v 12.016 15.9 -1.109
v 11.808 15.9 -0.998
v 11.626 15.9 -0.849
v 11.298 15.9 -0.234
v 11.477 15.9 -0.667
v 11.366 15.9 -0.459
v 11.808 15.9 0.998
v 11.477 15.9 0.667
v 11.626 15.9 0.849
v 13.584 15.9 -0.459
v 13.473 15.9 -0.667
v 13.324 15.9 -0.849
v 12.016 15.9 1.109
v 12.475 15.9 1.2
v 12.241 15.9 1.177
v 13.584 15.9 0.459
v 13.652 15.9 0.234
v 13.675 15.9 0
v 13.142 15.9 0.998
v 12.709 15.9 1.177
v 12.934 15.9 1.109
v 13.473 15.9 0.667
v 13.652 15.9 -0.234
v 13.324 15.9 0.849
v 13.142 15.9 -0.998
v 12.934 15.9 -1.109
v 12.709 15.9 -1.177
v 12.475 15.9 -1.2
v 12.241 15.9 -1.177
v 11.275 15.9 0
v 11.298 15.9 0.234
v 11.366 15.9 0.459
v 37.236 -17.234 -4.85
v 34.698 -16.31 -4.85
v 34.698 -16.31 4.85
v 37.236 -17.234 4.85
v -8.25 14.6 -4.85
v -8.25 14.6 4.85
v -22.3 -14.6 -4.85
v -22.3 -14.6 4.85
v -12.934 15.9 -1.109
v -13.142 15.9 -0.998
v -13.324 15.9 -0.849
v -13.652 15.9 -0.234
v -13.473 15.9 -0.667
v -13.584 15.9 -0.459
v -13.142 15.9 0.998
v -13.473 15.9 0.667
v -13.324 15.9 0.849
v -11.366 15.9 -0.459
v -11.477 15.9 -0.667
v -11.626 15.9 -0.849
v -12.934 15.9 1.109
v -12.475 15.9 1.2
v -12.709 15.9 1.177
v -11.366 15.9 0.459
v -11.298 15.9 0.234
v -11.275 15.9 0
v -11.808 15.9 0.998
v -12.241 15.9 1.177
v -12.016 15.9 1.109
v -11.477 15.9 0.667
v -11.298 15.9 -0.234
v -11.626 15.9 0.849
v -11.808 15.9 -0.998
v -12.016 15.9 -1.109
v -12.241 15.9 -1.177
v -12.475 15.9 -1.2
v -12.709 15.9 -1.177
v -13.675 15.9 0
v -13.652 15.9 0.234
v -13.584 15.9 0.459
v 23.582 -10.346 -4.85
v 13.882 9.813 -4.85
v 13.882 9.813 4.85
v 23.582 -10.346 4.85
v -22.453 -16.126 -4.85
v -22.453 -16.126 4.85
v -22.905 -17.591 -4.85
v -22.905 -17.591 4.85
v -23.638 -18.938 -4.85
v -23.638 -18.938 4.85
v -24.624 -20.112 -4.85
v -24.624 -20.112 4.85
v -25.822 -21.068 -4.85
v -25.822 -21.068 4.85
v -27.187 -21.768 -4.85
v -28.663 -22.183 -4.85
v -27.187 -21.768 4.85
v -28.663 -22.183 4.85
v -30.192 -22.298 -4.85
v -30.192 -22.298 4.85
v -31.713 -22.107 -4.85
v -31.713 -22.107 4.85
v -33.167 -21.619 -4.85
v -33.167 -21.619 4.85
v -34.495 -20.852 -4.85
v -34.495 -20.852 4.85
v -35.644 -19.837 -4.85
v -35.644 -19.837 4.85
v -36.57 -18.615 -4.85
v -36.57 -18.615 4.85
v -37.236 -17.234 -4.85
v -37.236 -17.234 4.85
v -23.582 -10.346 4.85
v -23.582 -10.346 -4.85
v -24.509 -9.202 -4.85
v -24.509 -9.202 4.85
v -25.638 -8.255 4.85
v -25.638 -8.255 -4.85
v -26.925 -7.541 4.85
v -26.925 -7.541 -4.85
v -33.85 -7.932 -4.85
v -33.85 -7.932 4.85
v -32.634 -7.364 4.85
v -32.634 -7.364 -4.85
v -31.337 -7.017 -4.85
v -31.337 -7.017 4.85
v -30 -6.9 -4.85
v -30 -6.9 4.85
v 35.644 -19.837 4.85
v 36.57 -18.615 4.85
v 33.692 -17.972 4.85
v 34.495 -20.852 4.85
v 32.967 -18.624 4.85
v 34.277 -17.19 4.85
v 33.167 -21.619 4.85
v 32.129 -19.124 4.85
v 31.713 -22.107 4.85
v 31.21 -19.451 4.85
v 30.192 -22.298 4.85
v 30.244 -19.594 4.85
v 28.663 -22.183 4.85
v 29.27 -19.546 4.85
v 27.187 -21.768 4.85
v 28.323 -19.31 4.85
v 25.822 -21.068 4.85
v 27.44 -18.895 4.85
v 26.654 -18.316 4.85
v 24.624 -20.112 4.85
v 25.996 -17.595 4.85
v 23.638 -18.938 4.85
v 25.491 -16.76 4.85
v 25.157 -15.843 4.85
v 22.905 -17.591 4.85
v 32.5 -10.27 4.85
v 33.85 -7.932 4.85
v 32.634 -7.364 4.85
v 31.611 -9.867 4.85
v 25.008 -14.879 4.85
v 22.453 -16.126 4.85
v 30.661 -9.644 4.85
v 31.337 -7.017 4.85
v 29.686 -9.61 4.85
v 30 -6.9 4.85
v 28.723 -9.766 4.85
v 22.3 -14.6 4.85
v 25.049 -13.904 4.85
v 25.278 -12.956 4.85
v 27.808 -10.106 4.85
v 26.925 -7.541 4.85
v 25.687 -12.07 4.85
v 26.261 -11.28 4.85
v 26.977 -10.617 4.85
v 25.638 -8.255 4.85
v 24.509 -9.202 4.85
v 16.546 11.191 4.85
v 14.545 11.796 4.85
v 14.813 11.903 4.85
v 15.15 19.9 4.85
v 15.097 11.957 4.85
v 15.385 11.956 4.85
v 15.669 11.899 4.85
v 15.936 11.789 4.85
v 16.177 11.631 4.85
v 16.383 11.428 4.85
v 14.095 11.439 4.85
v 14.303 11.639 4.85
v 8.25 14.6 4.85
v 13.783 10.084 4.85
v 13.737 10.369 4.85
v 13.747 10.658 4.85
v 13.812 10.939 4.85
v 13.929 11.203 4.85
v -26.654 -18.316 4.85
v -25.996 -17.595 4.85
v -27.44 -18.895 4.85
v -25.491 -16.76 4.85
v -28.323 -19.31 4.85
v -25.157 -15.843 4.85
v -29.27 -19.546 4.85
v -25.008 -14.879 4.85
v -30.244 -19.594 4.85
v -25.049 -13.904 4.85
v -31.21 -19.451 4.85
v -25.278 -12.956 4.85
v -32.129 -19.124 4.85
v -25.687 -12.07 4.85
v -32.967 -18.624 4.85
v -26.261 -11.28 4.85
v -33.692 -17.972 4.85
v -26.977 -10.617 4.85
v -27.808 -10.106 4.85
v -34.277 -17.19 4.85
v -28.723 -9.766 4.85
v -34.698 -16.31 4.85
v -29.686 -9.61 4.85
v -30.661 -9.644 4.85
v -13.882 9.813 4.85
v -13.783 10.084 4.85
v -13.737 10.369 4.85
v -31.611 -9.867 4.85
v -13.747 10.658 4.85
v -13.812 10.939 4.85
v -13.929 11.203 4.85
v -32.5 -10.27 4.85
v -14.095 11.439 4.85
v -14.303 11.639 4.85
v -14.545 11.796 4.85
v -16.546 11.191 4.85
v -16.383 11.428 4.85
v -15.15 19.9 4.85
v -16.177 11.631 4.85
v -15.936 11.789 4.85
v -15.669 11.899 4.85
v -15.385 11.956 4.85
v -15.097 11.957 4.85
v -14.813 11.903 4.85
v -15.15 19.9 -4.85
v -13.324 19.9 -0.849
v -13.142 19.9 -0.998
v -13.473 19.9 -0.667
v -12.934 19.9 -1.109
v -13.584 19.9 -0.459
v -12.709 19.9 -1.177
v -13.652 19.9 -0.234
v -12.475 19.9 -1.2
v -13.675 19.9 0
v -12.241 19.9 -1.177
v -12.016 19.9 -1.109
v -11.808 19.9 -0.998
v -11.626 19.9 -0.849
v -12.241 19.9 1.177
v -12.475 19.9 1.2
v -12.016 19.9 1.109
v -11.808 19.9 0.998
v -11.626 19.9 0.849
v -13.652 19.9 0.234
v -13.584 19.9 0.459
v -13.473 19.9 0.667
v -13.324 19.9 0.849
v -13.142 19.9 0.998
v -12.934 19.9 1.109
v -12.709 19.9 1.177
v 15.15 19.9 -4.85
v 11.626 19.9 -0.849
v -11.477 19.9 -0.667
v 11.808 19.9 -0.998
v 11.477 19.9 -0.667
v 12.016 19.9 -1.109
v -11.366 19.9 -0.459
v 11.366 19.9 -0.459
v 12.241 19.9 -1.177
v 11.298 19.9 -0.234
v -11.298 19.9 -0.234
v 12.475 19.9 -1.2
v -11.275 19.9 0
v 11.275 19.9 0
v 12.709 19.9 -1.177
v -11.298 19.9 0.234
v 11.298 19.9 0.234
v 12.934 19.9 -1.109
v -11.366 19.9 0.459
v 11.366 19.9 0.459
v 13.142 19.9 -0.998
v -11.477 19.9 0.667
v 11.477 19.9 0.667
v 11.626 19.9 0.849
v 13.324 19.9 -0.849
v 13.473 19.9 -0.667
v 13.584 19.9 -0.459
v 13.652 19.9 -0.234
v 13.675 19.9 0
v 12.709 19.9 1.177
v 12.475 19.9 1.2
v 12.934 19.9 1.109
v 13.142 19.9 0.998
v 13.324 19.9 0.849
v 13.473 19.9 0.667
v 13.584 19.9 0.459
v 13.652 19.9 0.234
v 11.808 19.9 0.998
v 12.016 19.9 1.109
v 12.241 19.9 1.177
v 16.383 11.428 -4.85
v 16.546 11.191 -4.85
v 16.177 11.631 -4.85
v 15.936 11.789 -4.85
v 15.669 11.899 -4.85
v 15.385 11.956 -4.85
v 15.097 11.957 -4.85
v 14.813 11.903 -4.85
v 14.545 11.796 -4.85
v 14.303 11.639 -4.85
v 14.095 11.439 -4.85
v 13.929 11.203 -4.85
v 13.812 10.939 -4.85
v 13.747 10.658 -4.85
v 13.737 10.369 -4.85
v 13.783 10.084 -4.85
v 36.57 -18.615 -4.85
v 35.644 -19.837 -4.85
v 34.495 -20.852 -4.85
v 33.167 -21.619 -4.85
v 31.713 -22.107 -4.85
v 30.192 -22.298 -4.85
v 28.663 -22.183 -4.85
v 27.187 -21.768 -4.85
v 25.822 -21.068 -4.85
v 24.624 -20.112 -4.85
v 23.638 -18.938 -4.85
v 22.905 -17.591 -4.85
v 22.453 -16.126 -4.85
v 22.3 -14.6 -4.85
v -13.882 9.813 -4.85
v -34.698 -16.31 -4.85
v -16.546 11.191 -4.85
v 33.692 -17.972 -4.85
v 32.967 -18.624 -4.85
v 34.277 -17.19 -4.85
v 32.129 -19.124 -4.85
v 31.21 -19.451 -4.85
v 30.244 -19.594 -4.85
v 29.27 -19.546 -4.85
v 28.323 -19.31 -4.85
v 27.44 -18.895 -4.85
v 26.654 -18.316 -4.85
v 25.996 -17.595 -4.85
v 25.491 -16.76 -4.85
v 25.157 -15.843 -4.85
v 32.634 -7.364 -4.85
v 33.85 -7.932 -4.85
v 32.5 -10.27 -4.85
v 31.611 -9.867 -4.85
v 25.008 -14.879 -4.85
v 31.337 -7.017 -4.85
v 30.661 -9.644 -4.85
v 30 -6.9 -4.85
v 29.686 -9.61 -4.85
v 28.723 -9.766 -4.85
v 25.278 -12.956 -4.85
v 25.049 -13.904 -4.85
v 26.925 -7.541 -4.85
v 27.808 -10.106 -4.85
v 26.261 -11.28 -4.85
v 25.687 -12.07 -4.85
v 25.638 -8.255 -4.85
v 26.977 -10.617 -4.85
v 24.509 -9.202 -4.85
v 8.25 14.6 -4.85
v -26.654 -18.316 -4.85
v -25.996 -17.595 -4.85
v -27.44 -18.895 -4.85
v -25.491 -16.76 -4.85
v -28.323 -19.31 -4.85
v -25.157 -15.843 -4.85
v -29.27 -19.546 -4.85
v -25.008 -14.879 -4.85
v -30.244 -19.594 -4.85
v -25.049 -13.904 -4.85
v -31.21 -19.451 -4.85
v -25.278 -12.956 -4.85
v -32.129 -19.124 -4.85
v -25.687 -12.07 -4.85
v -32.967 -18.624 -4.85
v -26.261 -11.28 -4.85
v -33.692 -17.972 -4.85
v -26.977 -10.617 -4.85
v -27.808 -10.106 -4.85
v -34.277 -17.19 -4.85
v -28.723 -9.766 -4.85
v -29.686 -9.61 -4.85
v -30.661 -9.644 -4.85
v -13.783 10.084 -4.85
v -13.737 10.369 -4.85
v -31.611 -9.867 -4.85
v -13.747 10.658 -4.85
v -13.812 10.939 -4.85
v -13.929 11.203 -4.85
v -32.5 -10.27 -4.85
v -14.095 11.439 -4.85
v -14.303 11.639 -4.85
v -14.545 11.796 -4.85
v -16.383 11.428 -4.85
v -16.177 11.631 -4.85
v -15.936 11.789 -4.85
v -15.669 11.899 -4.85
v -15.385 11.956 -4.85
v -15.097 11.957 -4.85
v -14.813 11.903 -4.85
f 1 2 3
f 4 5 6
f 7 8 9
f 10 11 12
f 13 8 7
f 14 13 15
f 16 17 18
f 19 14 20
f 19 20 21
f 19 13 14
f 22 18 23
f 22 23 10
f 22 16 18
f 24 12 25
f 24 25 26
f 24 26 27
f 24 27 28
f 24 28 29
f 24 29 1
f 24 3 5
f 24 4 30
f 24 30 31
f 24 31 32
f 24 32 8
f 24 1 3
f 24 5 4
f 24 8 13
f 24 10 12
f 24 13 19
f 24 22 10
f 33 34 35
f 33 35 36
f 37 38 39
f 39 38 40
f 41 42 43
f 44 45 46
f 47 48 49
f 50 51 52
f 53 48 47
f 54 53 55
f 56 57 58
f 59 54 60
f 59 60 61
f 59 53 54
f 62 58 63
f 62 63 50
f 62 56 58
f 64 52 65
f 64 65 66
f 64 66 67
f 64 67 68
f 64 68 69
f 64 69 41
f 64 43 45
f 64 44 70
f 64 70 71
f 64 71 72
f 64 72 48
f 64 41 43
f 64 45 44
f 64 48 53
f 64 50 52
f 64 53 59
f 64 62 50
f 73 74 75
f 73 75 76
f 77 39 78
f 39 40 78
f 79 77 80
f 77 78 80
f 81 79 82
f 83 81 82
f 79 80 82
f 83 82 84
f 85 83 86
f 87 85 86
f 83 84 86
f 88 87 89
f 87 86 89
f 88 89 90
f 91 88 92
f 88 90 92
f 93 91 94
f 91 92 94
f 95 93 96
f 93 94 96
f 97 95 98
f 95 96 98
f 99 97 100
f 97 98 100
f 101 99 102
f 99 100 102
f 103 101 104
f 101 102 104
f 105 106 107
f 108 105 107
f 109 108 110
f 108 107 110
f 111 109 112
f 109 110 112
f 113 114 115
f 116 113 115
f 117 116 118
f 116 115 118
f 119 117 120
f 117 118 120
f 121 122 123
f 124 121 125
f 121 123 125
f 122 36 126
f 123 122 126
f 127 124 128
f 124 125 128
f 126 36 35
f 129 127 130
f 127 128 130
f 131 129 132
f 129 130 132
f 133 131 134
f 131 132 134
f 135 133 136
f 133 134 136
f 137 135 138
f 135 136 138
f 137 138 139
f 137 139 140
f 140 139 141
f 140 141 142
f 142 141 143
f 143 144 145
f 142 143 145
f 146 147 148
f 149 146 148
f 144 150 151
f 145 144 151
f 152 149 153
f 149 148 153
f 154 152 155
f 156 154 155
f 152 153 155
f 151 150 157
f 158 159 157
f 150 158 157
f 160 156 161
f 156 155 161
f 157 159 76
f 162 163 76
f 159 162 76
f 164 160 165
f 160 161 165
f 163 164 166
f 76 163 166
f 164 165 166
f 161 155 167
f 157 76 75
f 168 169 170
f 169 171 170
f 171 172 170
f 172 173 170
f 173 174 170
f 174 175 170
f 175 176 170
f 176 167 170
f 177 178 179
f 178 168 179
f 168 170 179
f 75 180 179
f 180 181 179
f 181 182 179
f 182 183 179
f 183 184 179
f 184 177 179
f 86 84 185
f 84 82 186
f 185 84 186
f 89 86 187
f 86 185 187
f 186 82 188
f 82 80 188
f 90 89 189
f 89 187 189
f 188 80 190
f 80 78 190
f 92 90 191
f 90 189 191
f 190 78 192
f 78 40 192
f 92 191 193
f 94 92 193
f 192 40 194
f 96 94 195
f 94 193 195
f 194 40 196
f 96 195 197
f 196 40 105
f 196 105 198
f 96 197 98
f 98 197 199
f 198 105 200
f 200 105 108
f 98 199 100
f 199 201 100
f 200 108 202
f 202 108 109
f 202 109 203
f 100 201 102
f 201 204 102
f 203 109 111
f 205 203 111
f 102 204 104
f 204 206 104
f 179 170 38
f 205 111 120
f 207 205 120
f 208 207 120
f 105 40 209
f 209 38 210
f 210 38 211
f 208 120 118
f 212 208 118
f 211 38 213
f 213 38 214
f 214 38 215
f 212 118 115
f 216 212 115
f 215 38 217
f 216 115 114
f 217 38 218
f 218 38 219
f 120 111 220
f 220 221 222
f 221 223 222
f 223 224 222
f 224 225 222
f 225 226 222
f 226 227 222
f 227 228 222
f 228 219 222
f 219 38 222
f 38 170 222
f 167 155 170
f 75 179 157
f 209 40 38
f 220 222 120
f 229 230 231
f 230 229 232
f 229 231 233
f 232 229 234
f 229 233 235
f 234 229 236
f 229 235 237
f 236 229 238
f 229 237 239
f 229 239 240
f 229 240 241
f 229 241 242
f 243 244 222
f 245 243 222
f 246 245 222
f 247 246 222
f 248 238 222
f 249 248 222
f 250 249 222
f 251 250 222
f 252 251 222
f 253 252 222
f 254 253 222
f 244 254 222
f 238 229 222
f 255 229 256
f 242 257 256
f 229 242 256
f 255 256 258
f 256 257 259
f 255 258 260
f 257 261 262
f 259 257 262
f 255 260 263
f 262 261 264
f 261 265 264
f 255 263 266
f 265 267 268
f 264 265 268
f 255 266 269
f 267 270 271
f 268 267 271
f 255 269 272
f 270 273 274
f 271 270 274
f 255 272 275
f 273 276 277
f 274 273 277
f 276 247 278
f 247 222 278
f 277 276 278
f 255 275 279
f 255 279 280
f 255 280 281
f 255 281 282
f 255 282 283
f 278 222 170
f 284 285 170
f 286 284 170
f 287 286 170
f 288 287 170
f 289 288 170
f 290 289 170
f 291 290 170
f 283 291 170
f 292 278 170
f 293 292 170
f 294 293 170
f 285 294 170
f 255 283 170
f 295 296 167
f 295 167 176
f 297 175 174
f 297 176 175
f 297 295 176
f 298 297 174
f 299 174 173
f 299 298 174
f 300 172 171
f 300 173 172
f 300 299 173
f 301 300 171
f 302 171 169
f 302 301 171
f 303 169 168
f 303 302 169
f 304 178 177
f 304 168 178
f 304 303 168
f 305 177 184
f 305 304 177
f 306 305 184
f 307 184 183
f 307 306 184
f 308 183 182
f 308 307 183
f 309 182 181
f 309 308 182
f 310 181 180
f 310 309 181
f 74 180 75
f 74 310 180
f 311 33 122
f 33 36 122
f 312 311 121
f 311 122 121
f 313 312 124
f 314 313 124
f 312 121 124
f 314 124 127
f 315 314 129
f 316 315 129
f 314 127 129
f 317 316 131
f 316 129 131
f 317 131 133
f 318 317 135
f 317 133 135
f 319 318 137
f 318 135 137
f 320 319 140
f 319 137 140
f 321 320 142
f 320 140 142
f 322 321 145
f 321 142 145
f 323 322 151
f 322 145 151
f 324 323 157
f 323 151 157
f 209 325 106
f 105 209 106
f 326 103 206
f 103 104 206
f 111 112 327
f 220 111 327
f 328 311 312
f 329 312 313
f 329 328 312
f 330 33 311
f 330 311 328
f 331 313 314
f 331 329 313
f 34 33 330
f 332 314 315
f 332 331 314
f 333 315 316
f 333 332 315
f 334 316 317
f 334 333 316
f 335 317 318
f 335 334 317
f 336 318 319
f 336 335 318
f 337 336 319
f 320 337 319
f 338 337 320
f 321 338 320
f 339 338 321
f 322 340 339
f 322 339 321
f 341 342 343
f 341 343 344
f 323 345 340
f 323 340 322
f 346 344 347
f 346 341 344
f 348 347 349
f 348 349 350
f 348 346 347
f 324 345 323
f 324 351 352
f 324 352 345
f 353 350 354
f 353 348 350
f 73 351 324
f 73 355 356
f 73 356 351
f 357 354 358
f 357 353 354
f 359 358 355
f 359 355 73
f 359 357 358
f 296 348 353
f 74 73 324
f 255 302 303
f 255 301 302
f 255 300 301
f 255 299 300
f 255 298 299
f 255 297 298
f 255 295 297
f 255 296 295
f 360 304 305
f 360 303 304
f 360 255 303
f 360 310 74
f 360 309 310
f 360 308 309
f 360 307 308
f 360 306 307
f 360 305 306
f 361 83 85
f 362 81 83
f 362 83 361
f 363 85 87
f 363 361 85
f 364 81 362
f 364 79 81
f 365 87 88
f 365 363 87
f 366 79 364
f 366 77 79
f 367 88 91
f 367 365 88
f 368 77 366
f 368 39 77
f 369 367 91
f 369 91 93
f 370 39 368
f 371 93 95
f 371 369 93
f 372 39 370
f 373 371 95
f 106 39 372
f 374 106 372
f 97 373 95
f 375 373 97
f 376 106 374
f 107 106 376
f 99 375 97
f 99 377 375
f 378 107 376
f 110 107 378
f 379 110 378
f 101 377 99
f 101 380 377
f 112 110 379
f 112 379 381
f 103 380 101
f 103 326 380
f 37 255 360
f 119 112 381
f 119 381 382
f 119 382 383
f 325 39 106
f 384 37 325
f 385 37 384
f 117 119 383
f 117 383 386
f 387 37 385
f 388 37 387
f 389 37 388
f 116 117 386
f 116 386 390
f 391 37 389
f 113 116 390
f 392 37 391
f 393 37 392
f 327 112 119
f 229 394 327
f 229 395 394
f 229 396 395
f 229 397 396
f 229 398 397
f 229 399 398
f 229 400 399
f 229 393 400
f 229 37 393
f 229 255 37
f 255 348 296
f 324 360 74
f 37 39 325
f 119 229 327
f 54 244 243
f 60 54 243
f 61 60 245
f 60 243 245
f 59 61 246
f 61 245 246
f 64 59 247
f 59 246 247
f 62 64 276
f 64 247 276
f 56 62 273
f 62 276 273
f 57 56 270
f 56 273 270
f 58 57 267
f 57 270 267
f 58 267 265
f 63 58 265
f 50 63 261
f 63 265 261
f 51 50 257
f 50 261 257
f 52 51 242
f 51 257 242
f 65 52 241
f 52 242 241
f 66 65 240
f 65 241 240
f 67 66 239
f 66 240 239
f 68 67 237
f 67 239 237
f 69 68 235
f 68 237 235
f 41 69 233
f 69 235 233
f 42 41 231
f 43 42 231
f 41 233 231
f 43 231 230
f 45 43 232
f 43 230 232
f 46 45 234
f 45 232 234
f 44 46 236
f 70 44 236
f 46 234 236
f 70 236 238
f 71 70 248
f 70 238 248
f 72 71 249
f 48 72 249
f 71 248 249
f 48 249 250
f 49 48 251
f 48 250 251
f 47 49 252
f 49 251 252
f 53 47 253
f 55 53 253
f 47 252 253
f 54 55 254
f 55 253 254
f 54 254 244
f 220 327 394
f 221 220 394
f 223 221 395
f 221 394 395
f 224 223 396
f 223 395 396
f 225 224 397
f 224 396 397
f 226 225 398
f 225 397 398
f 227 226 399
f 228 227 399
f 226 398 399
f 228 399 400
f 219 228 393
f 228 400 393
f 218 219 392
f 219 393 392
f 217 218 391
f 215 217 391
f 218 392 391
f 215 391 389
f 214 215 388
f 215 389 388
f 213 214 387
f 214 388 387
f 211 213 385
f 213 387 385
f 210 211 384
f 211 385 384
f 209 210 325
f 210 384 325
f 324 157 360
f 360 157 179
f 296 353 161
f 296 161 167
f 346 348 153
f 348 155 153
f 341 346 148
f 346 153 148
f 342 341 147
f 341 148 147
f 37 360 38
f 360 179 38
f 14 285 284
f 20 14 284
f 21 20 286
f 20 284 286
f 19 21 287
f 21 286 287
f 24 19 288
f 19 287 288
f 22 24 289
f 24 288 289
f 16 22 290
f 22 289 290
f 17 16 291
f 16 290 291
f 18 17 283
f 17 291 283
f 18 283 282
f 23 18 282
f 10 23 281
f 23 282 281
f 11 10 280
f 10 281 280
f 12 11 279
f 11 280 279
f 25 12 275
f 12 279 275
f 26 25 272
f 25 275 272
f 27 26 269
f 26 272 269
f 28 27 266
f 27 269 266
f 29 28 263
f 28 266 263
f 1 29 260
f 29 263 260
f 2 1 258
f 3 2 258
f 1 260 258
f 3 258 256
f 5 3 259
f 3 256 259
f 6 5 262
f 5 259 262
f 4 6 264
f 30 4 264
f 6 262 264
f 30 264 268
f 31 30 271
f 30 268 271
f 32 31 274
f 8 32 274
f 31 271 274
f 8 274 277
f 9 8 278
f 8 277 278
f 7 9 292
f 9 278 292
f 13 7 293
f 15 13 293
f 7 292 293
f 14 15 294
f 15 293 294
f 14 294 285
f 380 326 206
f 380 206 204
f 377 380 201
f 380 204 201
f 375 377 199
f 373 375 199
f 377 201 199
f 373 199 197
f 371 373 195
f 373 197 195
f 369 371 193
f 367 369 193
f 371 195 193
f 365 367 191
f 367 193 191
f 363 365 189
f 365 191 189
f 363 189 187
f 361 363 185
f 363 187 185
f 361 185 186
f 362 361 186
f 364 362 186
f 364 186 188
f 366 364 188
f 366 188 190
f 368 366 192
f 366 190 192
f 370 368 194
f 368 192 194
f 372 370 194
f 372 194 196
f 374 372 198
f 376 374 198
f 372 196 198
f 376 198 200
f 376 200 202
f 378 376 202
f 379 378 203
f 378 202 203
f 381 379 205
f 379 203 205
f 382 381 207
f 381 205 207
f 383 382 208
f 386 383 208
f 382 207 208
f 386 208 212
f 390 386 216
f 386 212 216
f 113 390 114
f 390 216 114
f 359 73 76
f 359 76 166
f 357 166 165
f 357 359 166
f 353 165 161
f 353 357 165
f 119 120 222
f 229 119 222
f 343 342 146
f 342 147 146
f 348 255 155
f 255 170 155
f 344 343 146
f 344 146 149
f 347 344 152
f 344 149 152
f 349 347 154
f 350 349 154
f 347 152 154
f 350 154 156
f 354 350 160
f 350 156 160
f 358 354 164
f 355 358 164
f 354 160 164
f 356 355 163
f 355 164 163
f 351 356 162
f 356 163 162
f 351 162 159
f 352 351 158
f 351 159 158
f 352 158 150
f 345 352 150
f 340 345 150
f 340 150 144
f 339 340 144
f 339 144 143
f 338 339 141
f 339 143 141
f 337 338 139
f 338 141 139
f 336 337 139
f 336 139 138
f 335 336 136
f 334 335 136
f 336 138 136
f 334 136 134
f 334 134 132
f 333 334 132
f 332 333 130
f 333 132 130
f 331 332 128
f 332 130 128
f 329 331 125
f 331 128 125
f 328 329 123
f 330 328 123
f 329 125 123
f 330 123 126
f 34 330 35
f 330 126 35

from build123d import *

# Parameters (mm, degrees)
BOSS_EXTRUDE1_DEPTH     = 4.85
CUT_EXTRUDE1_DEPTH      = 44.672701752
CUT_EXTRUDE1_DEPTH_BACK = 44.672701752
SKETCH3_R               = 1.2
CUT_EXTRUDE2_DEPTH      = 4


with BuildPart() as part:
    # Sketch1 → Boss-Extrude1 (new, symmetric)
    with BuildSketch(Plane.XY):
        with BuildLine():
            Line((-15.15, 19.9), (15.15, 19.9))
            Line((15.15, 19.9), (30, -6.9))
            ThreePointArc((30, -6.9), (31.992906647, -7.162371138), (33.85, -7.931604391))
            Line((33.85, -7.931604391), (32.5, -10.269872981))
            ThreePointArc((32.5, -10.269872981), (25.301536896, -16.310100717), (34.698463104, -16.310100717))
            Line((34.698463104, -16.310100717), (37.23563318, -17.233555104))
            ThreePointArc((37.23563318, -17.233555104), (28.662909032, -22.183019698), (22.3, -14.6))
            Line((22.3, -14.6), (8.25, 14.6))
            Line((8.25, 14.6), (-8.25, 14.6))
            Line((-8.25, 14.6), (-22.3, -14.6))
            ThreePointArc((-22.3, -14.6), (-28.662909032, -22.183019698), (-37.23563318, -17.233555104))
            Line((-37.23563318, -17.233555104), (-34.698463104, -16.310100717))
            ThreePointArc((-34.698463104, -16.310100717), (-25.301536896, -16.310100717), (-32.5, -10.269872981))
            Line((-32.5, -10.269872981), (-33.85, -7.931604391))
            ThreePointArc((-33.85, -7.931604391), (-31.992906647, -7.162371138), (-30, -6.9))
            Line((-30, -6.9), (-15.15, 19.9))
        make_face()
    extrude(amount=BOSS_EXTRUDE1_DEPTH, both=True)

    # Sketch2 → Cut-Extrude1 (cut, two sides: drawn at the far end of the back side and taken through both)
    with BuildSketch(Plane.XY.offset(-CUT_EXTRUDE1_DEPTH_BACK)):
        with BuildLine():
            Line((-26.925180599, -7.540574694), (-16.546196528, 11.190521138))
            ThreePointArc((-16.546196528, 11.190521138), (-14.545175942, 11.795919776), (-13.88248318, 9.813136581))
            Line((-13.88248318, 9.813136581), (-23.582107554, -10.345513363))
            ThreePointArc((-23.582107554, -10.345513363), (-25.050776345, -8.701255624), (-26.925180599, -7.540574694))
        make_face()
        with BuildLine():
            Line((13.88248318, 9.813136581), (23.582107554, -10.345513363))
            ThreePointArc((23.582107554, -10.345513363), (25.050776345, -8.701255624), (26.925180599, -7.540574694))
            Line((26.925180599, -7.540574694), (16.546196528, 11.190521138))
            ThreePointArc((16.546196528, 11.190521138), (14.545175942, 11.795919776), (13.88248318, 9.813136581))
        make_face()
    extrude(amount=CUT_EXTRUDE1_DEPTH + CUT_EXTRUDE1_DEPTH_BACK, mode=Mode.SUBTRACT)

    # Sketch3 → Cut-Extrude2 (cut)
    with BuildSketch(Plane(origin=(0, 19.9, 0), x_dir=(1, 0, 0), z_dir=(0, 1, 0))):
        with Locations(Location((-12.475, 0, 0), (0, 0, 270))):
            Circle(SKETCH3_R)
        with Locations(Location((12.475, 0, 0), (0, 0, 270))):
            Circle(SKETCH3_R)
    extrude(amount=-CUT_EXTRUDE2_DEPTH, mode=Mode.SUBTRACT)


solid = part.part
